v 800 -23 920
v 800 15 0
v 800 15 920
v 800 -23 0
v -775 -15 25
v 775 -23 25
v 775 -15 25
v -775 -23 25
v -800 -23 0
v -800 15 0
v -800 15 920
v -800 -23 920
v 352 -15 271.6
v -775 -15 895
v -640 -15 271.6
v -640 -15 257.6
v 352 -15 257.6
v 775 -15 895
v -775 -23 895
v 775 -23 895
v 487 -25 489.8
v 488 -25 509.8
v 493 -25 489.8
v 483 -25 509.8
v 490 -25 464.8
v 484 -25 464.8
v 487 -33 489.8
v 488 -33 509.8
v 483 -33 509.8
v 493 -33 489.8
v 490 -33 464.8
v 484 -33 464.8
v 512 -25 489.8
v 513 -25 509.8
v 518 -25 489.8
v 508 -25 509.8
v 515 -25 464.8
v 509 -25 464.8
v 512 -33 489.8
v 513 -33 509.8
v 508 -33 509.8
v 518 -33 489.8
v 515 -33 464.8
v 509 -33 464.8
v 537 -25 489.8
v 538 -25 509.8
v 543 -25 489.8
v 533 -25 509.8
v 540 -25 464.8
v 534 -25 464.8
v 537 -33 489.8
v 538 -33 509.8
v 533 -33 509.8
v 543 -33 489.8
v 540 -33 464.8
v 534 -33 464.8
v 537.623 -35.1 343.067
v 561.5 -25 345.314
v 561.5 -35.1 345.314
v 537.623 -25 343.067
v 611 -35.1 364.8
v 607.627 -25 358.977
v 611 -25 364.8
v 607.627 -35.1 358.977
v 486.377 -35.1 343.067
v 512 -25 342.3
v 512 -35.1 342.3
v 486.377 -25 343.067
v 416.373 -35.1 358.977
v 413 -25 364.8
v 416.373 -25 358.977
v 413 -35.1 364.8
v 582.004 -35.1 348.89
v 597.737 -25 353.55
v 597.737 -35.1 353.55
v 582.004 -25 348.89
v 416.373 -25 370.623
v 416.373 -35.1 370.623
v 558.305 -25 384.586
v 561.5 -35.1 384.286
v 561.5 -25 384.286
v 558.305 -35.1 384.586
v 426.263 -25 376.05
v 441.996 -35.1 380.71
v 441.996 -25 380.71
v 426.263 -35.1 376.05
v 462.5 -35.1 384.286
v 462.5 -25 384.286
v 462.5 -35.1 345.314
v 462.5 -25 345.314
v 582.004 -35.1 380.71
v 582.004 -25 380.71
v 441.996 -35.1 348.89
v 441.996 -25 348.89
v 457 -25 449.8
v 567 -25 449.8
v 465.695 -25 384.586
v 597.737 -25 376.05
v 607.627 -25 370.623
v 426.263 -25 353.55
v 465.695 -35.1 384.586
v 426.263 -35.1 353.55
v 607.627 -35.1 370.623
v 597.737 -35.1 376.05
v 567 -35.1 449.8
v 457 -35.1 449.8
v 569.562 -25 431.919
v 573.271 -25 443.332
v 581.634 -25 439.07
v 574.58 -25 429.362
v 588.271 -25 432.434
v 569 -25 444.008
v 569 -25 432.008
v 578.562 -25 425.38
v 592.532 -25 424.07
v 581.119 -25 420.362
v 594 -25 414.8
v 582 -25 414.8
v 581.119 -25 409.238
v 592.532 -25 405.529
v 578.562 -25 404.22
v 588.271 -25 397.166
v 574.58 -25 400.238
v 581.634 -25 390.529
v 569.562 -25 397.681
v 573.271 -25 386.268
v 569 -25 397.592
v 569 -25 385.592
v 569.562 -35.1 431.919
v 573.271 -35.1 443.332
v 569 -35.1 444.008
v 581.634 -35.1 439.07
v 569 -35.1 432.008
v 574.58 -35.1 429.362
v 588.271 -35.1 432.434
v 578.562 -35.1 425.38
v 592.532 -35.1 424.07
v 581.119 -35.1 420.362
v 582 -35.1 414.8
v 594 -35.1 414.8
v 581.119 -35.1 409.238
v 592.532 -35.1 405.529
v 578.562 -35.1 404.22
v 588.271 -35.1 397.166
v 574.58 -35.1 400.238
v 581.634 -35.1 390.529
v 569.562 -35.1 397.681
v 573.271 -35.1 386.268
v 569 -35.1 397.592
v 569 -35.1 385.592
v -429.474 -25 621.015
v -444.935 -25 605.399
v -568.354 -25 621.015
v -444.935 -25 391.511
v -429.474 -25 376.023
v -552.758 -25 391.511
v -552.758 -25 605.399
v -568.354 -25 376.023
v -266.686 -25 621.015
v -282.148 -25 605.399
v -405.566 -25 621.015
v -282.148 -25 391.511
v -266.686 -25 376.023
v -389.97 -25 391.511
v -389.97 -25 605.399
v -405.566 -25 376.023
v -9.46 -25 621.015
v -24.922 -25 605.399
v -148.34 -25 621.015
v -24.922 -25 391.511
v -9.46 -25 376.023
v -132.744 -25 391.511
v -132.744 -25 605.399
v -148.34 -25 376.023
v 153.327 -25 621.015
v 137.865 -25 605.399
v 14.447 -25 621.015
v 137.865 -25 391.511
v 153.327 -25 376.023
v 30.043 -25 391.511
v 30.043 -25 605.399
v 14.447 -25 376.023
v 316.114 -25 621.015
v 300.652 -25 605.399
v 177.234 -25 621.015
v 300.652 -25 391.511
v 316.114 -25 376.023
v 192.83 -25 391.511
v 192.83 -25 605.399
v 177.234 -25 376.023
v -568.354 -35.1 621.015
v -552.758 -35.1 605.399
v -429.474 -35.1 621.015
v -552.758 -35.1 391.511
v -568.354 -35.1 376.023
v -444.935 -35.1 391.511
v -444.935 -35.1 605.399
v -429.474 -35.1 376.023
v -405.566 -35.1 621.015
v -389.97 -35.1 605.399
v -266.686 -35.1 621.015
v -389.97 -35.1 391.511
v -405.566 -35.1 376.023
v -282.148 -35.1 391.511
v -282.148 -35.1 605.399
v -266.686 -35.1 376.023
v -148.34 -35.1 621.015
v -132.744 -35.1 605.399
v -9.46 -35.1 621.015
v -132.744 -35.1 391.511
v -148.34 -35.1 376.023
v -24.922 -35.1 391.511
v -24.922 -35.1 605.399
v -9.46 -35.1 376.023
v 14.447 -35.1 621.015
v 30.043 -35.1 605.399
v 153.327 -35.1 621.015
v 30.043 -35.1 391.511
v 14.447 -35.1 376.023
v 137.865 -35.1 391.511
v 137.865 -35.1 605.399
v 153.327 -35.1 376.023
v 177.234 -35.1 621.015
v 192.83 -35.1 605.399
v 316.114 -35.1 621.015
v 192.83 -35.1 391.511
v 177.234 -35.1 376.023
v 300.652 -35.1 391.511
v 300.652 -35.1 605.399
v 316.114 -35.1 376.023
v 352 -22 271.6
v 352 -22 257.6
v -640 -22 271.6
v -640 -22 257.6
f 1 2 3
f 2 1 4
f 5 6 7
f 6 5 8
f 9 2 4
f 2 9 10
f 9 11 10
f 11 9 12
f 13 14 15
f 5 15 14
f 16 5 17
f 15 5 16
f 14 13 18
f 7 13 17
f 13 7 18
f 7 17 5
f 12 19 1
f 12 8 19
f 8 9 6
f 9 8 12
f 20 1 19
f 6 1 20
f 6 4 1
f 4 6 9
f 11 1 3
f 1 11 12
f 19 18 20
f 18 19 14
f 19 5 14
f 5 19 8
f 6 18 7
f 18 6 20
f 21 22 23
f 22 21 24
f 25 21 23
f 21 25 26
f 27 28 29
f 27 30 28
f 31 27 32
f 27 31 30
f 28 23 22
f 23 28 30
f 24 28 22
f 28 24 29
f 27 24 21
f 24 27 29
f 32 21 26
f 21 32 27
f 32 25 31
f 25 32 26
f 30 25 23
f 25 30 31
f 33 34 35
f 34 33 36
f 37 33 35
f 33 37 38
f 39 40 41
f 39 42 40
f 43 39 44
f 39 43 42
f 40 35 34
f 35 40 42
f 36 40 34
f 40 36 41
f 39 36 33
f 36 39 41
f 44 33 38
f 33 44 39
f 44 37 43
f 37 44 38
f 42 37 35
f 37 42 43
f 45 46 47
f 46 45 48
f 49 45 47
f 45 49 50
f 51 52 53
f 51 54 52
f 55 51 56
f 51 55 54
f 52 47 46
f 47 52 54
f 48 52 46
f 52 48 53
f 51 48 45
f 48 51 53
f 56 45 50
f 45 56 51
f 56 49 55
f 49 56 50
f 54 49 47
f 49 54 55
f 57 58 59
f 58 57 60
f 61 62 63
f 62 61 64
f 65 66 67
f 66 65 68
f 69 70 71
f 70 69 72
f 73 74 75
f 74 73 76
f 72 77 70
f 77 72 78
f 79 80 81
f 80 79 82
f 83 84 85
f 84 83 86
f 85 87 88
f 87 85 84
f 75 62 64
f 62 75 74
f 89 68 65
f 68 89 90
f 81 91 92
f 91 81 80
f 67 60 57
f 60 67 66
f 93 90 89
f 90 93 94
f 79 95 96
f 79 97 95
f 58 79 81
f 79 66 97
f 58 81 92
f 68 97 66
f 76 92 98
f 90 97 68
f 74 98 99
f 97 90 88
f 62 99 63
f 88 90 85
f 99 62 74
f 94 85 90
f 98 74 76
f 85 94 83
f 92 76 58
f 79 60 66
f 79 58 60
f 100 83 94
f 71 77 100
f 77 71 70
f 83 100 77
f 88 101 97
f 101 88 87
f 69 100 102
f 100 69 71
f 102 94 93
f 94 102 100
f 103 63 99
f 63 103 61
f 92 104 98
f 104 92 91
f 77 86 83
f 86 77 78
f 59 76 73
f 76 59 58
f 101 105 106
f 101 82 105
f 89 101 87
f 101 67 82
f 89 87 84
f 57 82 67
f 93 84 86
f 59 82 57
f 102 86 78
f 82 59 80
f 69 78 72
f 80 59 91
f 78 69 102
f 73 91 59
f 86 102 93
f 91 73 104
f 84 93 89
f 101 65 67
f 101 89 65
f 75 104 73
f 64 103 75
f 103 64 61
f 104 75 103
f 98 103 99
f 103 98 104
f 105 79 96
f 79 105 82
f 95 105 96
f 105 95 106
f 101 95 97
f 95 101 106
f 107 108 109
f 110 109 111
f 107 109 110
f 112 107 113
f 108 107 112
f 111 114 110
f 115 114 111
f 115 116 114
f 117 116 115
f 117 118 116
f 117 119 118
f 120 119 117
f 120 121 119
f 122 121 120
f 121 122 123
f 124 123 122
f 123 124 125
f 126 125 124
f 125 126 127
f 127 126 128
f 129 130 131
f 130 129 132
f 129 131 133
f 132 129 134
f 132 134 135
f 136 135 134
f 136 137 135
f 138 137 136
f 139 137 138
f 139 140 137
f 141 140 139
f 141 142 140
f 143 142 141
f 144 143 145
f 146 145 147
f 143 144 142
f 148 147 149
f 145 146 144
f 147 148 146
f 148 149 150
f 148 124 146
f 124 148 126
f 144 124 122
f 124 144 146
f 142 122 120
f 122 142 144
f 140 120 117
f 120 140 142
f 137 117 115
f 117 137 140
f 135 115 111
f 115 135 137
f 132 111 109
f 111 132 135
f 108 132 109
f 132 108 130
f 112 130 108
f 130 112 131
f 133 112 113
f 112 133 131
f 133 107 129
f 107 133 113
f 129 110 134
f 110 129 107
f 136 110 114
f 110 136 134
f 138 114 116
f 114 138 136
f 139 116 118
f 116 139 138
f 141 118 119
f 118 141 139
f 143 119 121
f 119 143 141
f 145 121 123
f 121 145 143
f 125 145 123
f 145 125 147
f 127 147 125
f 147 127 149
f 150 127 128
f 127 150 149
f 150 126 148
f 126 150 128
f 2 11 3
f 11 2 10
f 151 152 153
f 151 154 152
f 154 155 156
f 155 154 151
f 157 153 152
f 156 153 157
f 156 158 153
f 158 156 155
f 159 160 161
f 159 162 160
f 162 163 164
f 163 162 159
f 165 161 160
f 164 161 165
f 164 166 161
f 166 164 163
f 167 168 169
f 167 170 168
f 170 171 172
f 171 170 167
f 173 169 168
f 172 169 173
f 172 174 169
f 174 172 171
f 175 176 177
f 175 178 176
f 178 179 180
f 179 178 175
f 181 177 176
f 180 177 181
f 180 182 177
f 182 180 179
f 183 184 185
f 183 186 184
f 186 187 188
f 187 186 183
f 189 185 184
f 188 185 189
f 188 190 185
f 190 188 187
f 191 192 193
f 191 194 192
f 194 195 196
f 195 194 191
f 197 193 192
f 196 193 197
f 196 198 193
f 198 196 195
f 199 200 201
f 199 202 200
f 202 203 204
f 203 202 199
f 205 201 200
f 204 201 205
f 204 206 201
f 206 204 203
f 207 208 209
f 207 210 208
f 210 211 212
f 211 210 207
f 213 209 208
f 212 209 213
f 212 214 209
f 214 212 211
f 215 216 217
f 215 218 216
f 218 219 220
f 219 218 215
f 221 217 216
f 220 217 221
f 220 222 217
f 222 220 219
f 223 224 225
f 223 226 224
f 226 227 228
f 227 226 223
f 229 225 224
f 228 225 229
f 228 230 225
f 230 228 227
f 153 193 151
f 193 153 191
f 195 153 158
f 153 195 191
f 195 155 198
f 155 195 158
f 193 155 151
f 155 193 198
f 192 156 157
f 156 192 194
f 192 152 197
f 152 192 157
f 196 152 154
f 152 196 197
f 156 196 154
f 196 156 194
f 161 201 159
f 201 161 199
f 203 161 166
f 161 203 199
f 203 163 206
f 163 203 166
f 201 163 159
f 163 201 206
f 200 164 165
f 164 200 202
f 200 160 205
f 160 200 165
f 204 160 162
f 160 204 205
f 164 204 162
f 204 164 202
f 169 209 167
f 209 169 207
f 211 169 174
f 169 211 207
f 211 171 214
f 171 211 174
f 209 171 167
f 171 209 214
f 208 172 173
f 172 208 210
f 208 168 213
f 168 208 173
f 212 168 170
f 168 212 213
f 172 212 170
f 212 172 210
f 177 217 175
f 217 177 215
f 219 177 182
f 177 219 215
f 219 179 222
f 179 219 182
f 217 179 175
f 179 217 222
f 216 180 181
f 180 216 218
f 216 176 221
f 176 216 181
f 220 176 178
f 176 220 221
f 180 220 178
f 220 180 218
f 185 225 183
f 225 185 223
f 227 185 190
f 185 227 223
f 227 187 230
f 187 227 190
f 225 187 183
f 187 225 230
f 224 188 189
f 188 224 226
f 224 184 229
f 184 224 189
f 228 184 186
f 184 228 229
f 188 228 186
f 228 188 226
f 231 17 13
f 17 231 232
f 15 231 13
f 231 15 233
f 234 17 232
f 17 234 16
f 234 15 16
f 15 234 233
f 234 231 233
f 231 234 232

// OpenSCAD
// file: tea_shop_signage_parameters.scad
// =============================================================================
// TEA SHOP DIORAMA — SIGNAGE PARAMETERS (3D TAMIL "டீ கடை")
// =============================================================================
// All units: mm (1000 mm = 1.0 m), 1:1 real-world scale (1000 units = 1 GTA unit).
// Shared global coordinate system (identical to Groups 1–4):
//   +X -> left -> right  (0 = left outer wall, BUILD_W = right outer wall)
//   +Y -> front -> back  (0 = front eave wall, BUILD_D = back wall)
//   +Z -> up             (0 = ground / plinth top datum)
// =============================================================================

// --- SHARED GLOBAL VARIABLES (Reused from Groups 1–4) ------------------------
WALL_T             = 250;   // wall panel thickness
BUILD_W            = 6000;  // building width along X (6.00 m)
BUILD_D            = 4000;  // building depth along Y (4.00 m)
BACK_H             = 3200;  // wall height at BACK (tall side)
FRONT_H            = 2400;  // wall height at FRONT eave (short side)

// Group 1 front opening & plinth references:
left_pier_width    = 600;
window_width       = 3400;
mid_pier_width     = 500;
door_width         = 1000;
sill_height        = 900;

window_left        = left_pier_width;                   // 600 mm
window_right       = window_left + window_width;        // 4000 mm
door_left          = window_right + mid_pier_width;     // 4500 mm
door_right         = door_left + door_width;            // 5500 mm

// Group 2/3 roof slope derivation:
ROOF_RISE          = BACK_H - FRONT_H;                 // 800 mm
ROOF_RUN           = BUILD_D;                           // 4000 mm
ROOF_ANGLE         = atan(ROOF_RISE / ROOF_RUN);        // ~11.3099°

// Group 3 pergola structure references:
POST_SIZE          = 100;
POST_Y             = -2250;                             // front post line (mm)
MAIN_BEAM_WIDTH    = 80;
MAIN_BEAM_HEIGHT   = 120;
CROSS_BEAM_WIDTH   = 80;
CROSS_BEAM_HEIGHT  = 100;
PERGOLA_EAVE_Z     = FRONT_H;
POST_HEIGHT        = PERGOLA_EAVE_Z - abs(POST_Y) * tan(ROOF_ANGLE) - CROSS_BEAM_HEIGHT - MAIN_BEAM_HEIGHT;


// =============================================================================
// SIGNAGE PARAMETERS — ACCURATE SCALE & FACADE POSITIONING
// =============================================================================

// --- 1. Main Hanging Signboard ("டீ கடை") --------------------------------------
// REFERENCE OBSERVATIONS (Images 9b1fed6bc4, 0d34e93fe1, 9cc7378ff7):
// - Positioned centered directly on the front facade: X = BUILD_W / 2 = 3000 mm.
// - Dimensions: 1600 mm wide x 920 mm high, 30 mm thick base plate.
// - Raised outer protective rim border (25 mm wide, 8 mm projection).
// - 3D Tamil typography: "டீ கடை" (Tea Kadai) extruded in bold 3D letters.
// - Decorative separator line + authentic 3D tea cup graphic on right side.
// - Bottom edge rests directly on top of the front pergola canopy / beam line.
HANGING_SIGN_W     = 1600;  // signboard width along X (mm)
HANGING_SIGN_H     = 920;   // signboard height along Z (mm)
HANGING_SIGN_T     = 30;    // board base plate thickness along Y (mm)
HANGING_SIGN_RIM_W = 25;    // width of outer raised border frame (mm)
HANGING_SIGN_RIM_T = 8;     // projection of outer border frame (mm)
HANGING_SIGN_LET_T = 10;    // extrusion depth of 3D Tamil text & graphics (mm)

HANGING_SIGN_X     = BUILD_W / 2; // Centered at X = 3000 mm on front facade
HANGING_SIGN_Y     = POST_Y - MAIN_BEAM_WIDTH / 2 - HANGING_SIGN_T; // sitting on front face of beam
// Elevation: bottom rests flush on top of the pergola canopy eave line:
HANGING_SIGN_Z     = PERGOLA_EAVE_Z - abs(POST_Y) * tan(ROOF_ANGLE) + 10; // ≈ 1960 mm


// --- 2. Sign Bracket / Mounting Framework ------------------------------------
// Timber framework supporting the sign from behind, anchoring it to the pergola:
BRACKET_POST_W     = 90;    // upright support timber width along X (mm)
BRACKET_POST_D     = 80;    // upright support timber depth along Y (mm)
BRACKET_POST_TOP_Z = HANGING_SIGN_Z + HANGING_SIGN_H;
BRACKET_POST_H     = BRACKET_POST_TOP_Z - (POST_HEIGHT + MAIN_BEAM_HEIGHT);

BRACKET_BATTEN_W   = HANGING_SIGN_W - 120; // rear cross-batten width along X (mm)
BRACKET_BATTEN_D   = 45;                   // rear cross-batten depth along Y (mm)
BRACKET_BATTEN_H   = 55;                   // rear cross-batten height along Z (mm)


// --- 3. Front Wall Price List Sign ("விலைப்பட்டியல்") ------------------------
// REFERENCE OBSERVATIONS (Images 9b1fed6bc4, 8ffafd36e4):
// - Mounted flat on the exterior front knee-wall sill, beneath the service window.
// - Dimensions: 520 mm wide x 420 mm high x 15 mm thick.
// - Outer frame rim (15 mm wide) + 3D Tamil header "விலைப்பட்டியல்" (Price List).
PRICE_SIGN_W       = 520;   // width along X (mm)
PRICE_SIGN_H       = 420;   // height along Z (mm)
PRICE_SIGN_T       = 15;    // thickness along Y (mm)
PRICE_SIGN_RIM_W   = 15;    // border rim width (mm)
PRICE_SIGN_RIM_T   = 5;     // border rim thickness (mm)
PRICE_SIGN_LET_T   = 6;     // text/lines extrusion depth (mm)

PRICE_SIGN_X       = window_left + 450; // X = 1050 mm
PRICE_SIGN_Y       = -PRICE_SIGN_T - 2; // 2 mm proud of front wall (prevents z-fighting)
PRICE_SIGN_Z       = 350;               // centered vertically on the 900mm sill
// main file
// =============================================================================
// part_hanging_sign_board.scad — Export the 3D Tamil "டீ கடை" signboard.
// =============================================================================
// Centered at local origin [0, 0, 0] for direct Blender import!
// Spawns right at the 3D cursor / viewport center in Blender.
// Press F6 (render), then File -> Export as OBJ (or STL).
// =============================================================================

include <tea_shop_signage_modules.scad>;

// world_pos = false centers the model at local origin [0, 0, 0]
hanging_sign_board(world_pos = false);
